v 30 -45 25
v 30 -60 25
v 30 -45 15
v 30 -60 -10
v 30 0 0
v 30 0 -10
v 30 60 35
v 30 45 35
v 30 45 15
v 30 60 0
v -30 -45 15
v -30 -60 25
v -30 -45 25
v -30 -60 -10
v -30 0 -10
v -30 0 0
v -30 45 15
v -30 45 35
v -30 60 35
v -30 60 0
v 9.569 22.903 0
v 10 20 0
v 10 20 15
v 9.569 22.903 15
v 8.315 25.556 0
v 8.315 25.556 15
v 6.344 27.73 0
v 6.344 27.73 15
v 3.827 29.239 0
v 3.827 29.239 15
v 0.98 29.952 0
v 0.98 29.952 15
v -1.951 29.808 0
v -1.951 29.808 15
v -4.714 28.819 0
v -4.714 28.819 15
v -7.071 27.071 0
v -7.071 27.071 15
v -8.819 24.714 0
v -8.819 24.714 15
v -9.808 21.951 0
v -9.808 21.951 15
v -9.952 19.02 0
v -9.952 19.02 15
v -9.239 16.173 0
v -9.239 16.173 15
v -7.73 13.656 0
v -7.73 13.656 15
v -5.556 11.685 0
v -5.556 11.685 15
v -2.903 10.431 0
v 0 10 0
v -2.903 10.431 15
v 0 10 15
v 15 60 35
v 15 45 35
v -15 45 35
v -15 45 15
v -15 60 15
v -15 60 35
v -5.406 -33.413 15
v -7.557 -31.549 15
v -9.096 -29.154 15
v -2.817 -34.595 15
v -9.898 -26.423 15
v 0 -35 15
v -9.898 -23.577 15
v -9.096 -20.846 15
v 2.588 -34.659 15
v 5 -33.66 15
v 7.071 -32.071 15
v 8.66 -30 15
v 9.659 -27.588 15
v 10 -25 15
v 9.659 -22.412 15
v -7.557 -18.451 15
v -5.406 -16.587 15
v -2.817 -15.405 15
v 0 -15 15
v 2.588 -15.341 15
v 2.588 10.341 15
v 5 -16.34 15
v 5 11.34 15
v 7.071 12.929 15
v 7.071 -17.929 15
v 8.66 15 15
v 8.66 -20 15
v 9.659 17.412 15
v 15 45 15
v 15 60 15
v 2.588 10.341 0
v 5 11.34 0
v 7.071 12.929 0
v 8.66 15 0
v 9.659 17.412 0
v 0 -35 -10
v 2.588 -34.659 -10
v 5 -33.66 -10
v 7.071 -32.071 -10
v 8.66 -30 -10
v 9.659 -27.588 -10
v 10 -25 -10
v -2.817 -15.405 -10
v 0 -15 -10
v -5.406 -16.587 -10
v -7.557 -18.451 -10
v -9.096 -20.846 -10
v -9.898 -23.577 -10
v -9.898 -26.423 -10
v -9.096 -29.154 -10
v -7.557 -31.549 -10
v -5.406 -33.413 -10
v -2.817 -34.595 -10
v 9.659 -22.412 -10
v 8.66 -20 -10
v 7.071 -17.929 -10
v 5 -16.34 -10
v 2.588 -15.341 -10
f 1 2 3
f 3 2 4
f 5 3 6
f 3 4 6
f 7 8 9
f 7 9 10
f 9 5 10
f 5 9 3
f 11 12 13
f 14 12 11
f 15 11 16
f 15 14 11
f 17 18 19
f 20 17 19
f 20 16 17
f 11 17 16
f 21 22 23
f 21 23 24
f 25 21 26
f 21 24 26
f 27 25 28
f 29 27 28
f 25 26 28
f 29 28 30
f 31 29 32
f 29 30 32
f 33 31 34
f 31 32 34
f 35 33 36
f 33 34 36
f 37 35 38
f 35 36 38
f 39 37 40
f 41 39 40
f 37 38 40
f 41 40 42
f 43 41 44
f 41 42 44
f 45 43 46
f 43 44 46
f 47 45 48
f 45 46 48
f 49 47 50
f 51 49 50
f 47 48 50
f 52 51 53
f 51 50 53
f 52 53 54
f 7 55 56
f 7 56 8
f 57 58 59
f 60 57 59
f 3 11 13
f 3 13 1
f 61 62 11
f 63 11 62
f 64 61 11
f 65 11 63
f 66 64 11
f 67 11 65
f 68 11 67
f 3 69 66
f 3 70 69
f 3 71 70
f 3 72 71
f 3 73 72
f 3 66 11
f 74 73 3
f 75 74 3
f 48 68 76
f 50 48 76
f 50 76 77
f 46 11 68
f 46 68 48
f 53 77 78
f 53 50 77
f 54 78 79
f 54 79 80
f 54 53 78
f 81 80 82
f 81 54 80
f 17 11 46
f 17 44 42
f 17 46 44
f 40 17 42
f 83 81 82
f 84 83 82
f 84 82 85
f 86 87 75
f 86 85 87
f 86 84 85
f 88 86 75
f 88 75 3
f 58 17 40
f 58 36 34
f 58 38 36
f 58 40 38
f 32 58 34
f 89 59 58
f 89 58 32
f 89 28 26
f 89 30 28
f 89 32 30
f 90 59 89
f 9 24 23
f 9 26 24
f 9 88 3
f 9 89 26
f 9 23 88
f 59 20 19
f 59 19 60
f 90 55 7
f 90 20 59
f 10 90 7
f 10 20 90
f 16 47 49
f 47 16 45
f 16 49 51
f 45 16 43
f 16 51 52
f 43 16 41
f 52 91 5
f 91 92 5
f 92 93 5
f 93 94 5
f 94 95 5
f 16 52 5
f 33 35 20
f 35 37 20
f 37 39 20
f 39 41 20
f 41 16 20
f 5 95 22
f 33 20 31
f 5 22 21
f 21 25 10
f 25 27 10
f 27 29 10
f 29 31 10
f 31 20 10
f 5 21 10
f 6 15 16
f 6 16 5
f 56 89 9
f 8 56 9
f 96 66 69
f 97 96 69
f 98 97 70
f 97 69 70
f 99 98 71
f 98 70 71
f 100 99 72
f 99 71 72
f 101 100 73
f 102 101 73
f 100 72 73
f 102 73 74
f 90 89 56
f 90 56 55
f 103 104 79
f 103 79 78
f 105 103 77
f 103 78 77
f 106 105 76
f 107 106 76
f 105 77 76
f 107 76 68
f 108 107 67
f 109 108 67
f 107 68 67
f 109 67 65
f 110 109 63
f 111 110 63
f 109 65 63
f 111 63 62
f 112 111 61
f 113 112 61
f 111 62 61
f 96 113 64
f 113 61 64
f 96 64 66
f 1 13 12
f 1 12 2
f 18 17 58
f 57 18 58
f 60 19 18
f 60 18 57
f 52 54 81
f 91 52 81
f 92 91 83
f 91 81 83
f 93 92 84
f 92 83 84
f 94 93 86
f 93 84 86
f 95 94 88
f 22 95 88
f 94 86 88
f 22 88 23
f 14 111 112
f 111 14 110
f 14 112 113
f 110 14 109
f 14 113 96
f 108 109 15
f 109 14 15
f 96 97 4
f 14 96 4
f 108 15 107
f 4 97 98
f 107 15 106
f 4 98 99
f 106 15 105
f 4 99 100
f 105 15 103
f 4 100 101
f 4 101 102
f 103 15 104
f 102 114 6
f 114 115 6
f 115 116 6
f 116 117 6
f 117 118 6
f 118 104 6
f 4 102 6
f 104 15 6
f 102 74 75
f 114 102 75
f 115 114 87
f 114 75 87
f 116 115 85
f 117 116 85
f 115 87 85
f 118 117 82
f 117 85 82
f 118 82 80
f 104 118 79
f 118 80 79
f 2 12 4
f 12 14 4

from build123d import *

# Parameters (mm, degrees)
F0_W     = 60
F0_H     = 15
F0_H_2   = 45
F1_DEPTH = 10
F2_DEPTH = 25
F3_DEPTH = 15
F0_W_2   = 15
F4_DEPTH = 15
F5_W     = 15
F5_H     = 15
F6_DEPTH = 20
F8_DEPTH = 40


with BuildPart() as f1:
    # F0 (on Top) → F1 (new body)
    with BuildSketch(Plane.XY):
        with Locations((0, -52.5)):
            Rectangle(F0_W, F0_H)
        with Locations((0, -22.5)):
            Rectangle(F0_W, F0_H_2)
    extrude(amount=-F1_DEPTH)

    # F0 (on Top) → F2 (join)
    with BuildSketch(Plane.XY):
        with Locations((0, -52.5)):
            Rectangle(F0_W, F0_H)
    extrude(amount=F2_DEPTH)

    # F0 (on Top) → F3 (join)
    with BuildSketch(Plane.XY):
        with Locations((0, -22.5)):
            Rectangle(F0_W, F0_H_2)
    extrude(amount=F3_DEPTH)

    # F0 (on Top) → F4 (join, through all)
    with BuildSketch(Plane.XY):
        with Locations((22.5, 52.5)):
            Rectangle(F0_W_2, F0_H)
        Polygon((15, 45), (15, 60), (-15, 60), (-15, 45), (-30, 45), (-30, 0), (30, 0), (30, 45), align=None)
        with Locations((-22.5, 52.5)):
            Rectangle(F0_W_2, F0_H)
    extrude(amount=F4_DEPTH)

    # F5 (on face) → F6 (join)
    with BuildSketch(Plane.XY.offset(15)):
        with Locations((-22.5, 52.5)):
            Rectangle(F5_W, F5_H)
        with Locations((22.5, 52.5)):
            Rectangle(F5_W, F5_H)
    extrude(amount=F6_DEPTH)

    # F7 (on face) → F8 (cut)
    with BuildSketch(Plane.XY.offset(15)):
        with BuildLine():
            ThreePointArc((10, 20), (-7.071068, 27.071068), (0, 10))
            ThreePointArc((0, 10), (7.071068, 12.928932), (10, 20))
        make_face()
        with BuildLine():
            Line((0, -25), (0, -35))
            ThreePointArc((0, -35), (7.071068, -32.071068), (10, -25))
            ThreePointArc((10, -25), (7.071068, -17.928932), (0, -15))
            Line((0, -15), (0, -25))
        make_face()
        with BuildLine():
            ThreePointArc((0, -15), (-10, -25), (0, -35))
            Line((0, -35), (0, -25))
            Line((0, -25), (0, -15))
        make_face()
    extrude(amount=-F8_DEPTH, mode=Mode.SUBTRACT)


solid = f1.part
